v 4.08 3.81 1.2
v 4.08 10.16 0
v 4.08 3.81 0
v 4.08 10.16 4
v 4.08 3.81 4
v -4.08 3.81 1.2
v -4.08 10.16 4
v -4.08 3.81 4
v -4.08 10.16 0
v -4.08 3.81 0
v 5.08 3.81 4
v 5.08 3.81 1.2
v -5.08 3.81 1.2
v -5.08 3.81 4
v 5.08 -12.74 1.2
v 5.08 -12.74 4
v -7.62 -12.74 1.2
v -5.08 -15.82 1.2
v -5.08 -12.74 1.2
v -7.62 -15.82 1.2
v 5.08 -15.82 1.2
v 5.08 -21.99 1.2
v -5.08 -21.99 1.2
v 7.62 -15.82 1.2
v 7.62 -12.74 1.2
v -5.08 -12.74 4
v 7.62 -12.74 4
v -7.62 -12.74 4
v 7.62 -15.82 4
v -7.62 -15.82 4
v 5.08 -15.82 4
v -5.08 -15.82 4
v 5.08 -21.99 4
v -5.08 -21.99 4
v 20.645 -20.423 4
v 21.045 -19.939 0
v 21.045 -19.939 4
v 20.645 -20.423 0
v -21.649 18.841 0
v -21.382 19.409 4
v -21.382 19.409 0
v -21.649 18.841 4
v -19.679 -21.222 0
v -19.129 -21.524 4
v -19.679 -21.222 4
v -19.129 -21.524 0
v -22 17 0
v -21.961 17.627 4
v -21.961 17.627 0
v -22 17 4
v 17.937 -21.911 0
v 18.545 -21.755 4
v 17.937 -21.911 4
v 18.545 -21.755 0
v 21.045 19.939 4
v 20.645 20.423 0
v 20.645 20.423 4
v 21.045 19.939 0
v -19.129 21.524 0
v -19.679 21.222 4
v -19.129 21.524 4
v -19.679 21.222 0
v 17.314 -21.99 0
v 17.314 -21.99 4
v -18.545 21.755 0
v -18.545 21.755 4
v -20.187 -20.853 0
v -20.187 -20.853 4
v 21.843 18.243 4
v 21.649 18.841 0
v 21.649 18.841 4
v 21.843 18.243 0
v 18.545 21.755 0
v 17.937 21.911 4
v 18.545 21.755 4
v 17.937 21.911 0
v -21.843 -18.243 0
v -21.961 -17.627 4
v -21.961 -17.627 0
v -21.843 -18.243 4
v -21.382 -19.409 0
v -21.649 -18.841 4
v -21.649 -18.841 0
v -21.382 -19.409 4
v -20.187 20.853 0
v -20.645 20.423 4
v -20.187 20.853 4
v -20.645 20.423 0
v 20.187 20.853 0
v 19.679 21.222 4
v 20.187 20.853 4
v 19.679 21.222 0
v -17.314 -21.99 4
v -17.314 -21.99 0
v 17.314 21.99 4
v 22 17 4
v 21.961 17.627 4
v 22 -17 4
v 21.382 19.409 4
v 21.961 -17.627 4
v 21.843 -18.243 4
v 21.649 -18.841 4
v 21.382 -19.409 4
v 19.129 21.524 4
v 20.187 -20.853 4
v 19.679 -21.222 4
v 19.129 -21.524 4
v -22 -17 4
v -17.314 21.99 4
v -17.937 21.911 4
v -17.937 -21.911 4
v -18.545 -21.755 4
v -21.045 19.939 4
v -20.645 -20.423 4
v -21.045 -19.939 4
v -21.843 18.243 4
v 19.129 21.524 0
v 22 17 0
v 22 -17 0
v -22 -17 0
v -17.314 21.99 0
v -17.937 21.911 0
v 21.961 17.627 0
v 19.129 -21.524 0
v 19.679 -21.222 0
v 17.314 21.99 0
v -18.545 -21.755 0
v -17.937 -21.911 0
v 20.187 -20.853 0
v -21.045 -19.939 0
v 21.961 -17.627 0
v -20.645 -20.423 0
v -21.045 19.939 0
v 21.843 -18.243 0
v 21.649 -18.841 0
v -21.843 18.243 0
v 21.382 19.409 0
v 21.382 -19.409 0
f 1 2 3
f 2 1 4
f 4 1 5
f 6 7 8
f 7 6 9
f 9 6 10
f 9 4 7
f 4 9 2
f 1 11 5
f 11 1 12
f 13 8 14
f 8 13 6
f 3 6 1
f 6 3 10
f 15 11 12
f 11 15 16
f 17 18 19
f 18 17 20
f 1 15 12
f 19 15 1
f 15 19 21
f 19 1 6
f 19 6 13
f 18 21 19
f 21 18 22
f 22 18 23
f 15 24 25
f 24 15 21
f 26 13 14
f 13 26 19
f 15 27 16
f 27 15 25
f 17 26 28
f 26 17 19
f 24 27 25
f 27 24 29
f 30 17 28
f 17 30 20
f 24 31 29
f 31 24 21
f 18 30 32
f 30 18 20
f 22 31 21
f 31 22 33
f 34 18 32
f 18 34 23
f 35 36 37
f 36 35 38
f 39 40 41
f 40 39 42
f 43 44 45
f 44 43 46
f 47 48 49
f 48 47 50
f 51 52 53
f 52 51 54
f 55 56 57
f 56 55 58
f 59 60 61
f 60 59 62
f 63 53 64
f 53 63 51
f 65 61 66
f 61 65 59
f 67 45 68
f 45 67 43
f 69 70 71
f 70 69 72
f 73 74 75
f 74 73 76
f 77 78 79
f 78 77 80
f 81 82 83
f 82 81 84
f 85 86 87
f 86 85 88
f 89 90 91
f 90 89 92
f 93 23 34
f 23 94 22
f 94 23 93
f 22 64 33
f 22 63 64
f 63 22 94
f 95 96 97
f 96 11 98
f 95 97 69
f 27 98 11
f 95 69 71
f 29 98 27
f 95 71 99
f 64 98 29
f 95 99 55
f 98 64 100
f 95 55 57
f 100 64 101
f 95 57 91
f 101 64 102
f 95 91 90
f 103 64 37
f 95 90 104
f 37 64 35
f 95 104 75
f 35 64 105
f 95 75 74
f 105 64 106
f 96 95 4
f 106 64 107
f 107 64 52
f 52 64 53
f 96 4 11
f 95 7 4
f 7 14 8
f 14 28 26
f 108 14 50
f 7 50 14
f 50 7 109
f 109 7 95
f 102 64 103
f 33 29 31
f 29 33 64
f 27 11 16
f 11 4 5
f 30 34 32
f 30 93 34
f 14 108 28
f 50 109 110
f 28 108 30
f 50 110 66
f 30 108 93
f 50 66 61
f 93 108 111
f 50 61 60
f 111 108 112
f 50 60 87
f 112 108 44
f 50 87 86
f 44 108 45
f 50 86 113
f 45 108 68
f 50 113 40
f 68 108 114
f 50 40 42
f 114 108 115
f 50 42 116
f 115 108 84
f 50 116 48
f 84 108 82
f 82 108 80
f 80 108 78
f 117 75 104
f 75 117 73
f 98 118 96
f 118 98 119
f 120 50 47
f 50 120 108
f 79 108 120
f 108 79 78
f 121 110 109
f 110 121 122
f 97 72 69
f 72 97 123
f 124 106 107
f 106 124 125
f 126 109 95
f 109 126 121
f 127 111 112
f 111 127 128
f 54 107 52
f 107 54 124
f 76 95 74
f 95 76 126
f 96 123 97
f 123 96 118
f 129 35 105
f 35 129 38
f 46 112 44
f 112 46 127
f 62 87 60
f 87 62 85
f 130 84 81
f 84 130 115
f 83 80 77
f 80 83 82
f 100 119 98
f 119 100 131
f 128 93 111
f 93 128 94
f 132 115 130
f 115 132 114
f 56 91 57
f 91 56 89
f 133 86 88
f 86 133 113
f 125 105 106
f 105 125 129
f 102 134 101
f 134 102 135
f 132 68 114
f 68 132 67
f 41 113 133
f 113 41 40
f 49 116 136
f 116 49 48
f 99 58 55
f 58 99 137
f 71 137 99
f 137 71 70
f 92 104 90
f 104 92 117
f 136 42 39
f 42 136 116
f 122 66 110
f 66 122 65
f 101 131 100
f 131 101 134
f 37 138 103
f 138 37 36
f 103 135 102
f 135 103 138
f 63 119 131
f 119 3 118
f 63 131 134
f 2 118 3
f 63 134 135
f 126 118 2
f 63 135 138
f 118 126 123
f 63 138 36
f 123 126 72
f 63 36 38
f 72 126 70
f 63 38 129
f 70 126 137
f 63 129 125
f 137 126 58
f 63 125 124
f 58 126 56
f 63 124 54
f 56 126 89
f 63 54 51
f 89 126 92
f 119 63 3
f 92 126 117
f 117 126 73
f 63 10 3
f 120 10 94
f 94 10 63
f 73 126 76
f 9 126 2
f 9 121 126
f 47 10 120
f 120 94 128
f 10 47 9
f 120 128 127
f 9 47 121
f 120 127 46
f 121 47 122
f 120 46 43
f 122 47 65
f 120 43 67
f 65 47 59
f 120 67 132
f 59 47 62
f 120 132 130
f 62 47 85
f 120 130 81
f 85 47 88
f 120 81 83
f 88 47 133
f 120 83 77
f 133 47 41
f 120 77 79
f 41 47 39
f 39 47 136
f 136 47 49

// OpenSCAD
$fn = 50;

difference() {
	union() {
		translate(v = [0, 0, 0]) {
			rotate(a = [0, 0, 0]) {
				difference() {
					union() {
						hull() {
							translate(v = [-17.0, 17.0, 0]) {
								cylinder(h = 4, r = 5);
							}
							translate(v = [17.0, 17.0, 0]) {
								cylinder(h = 4, r = 5);
							}
							translate(v = [-17.0, -17.0, 0]) {
								cylinder(h = 4, r = 5);
							}
							translate(v = [17.0, -17.0, 0]) {
								cylinder(h = 4, r = 5);
							}
						}
					}
					union() {
						translate(v = [-4.08, 3.8100000000000005, -1]) {
							cube(size = [8.16, 6.35, 6]);
						}
						translate(v = [-5.08, -12.74, 1.2000000000000002]) {
							cube(size = [10.16, 16.55, 3.8]);
						}
						translate(v = [-7.62, -15.82, 1.2000000000000002]) {
							cube(size = [15.24, 3.08, 3.8]);
						}
						translate(v = [-5.08, -35.82, 1.2000000000000002]) {
							cube(size = [10.16, 20, 3.8]);
						}
					}
				}
			}
		}
	}
	union();
}
